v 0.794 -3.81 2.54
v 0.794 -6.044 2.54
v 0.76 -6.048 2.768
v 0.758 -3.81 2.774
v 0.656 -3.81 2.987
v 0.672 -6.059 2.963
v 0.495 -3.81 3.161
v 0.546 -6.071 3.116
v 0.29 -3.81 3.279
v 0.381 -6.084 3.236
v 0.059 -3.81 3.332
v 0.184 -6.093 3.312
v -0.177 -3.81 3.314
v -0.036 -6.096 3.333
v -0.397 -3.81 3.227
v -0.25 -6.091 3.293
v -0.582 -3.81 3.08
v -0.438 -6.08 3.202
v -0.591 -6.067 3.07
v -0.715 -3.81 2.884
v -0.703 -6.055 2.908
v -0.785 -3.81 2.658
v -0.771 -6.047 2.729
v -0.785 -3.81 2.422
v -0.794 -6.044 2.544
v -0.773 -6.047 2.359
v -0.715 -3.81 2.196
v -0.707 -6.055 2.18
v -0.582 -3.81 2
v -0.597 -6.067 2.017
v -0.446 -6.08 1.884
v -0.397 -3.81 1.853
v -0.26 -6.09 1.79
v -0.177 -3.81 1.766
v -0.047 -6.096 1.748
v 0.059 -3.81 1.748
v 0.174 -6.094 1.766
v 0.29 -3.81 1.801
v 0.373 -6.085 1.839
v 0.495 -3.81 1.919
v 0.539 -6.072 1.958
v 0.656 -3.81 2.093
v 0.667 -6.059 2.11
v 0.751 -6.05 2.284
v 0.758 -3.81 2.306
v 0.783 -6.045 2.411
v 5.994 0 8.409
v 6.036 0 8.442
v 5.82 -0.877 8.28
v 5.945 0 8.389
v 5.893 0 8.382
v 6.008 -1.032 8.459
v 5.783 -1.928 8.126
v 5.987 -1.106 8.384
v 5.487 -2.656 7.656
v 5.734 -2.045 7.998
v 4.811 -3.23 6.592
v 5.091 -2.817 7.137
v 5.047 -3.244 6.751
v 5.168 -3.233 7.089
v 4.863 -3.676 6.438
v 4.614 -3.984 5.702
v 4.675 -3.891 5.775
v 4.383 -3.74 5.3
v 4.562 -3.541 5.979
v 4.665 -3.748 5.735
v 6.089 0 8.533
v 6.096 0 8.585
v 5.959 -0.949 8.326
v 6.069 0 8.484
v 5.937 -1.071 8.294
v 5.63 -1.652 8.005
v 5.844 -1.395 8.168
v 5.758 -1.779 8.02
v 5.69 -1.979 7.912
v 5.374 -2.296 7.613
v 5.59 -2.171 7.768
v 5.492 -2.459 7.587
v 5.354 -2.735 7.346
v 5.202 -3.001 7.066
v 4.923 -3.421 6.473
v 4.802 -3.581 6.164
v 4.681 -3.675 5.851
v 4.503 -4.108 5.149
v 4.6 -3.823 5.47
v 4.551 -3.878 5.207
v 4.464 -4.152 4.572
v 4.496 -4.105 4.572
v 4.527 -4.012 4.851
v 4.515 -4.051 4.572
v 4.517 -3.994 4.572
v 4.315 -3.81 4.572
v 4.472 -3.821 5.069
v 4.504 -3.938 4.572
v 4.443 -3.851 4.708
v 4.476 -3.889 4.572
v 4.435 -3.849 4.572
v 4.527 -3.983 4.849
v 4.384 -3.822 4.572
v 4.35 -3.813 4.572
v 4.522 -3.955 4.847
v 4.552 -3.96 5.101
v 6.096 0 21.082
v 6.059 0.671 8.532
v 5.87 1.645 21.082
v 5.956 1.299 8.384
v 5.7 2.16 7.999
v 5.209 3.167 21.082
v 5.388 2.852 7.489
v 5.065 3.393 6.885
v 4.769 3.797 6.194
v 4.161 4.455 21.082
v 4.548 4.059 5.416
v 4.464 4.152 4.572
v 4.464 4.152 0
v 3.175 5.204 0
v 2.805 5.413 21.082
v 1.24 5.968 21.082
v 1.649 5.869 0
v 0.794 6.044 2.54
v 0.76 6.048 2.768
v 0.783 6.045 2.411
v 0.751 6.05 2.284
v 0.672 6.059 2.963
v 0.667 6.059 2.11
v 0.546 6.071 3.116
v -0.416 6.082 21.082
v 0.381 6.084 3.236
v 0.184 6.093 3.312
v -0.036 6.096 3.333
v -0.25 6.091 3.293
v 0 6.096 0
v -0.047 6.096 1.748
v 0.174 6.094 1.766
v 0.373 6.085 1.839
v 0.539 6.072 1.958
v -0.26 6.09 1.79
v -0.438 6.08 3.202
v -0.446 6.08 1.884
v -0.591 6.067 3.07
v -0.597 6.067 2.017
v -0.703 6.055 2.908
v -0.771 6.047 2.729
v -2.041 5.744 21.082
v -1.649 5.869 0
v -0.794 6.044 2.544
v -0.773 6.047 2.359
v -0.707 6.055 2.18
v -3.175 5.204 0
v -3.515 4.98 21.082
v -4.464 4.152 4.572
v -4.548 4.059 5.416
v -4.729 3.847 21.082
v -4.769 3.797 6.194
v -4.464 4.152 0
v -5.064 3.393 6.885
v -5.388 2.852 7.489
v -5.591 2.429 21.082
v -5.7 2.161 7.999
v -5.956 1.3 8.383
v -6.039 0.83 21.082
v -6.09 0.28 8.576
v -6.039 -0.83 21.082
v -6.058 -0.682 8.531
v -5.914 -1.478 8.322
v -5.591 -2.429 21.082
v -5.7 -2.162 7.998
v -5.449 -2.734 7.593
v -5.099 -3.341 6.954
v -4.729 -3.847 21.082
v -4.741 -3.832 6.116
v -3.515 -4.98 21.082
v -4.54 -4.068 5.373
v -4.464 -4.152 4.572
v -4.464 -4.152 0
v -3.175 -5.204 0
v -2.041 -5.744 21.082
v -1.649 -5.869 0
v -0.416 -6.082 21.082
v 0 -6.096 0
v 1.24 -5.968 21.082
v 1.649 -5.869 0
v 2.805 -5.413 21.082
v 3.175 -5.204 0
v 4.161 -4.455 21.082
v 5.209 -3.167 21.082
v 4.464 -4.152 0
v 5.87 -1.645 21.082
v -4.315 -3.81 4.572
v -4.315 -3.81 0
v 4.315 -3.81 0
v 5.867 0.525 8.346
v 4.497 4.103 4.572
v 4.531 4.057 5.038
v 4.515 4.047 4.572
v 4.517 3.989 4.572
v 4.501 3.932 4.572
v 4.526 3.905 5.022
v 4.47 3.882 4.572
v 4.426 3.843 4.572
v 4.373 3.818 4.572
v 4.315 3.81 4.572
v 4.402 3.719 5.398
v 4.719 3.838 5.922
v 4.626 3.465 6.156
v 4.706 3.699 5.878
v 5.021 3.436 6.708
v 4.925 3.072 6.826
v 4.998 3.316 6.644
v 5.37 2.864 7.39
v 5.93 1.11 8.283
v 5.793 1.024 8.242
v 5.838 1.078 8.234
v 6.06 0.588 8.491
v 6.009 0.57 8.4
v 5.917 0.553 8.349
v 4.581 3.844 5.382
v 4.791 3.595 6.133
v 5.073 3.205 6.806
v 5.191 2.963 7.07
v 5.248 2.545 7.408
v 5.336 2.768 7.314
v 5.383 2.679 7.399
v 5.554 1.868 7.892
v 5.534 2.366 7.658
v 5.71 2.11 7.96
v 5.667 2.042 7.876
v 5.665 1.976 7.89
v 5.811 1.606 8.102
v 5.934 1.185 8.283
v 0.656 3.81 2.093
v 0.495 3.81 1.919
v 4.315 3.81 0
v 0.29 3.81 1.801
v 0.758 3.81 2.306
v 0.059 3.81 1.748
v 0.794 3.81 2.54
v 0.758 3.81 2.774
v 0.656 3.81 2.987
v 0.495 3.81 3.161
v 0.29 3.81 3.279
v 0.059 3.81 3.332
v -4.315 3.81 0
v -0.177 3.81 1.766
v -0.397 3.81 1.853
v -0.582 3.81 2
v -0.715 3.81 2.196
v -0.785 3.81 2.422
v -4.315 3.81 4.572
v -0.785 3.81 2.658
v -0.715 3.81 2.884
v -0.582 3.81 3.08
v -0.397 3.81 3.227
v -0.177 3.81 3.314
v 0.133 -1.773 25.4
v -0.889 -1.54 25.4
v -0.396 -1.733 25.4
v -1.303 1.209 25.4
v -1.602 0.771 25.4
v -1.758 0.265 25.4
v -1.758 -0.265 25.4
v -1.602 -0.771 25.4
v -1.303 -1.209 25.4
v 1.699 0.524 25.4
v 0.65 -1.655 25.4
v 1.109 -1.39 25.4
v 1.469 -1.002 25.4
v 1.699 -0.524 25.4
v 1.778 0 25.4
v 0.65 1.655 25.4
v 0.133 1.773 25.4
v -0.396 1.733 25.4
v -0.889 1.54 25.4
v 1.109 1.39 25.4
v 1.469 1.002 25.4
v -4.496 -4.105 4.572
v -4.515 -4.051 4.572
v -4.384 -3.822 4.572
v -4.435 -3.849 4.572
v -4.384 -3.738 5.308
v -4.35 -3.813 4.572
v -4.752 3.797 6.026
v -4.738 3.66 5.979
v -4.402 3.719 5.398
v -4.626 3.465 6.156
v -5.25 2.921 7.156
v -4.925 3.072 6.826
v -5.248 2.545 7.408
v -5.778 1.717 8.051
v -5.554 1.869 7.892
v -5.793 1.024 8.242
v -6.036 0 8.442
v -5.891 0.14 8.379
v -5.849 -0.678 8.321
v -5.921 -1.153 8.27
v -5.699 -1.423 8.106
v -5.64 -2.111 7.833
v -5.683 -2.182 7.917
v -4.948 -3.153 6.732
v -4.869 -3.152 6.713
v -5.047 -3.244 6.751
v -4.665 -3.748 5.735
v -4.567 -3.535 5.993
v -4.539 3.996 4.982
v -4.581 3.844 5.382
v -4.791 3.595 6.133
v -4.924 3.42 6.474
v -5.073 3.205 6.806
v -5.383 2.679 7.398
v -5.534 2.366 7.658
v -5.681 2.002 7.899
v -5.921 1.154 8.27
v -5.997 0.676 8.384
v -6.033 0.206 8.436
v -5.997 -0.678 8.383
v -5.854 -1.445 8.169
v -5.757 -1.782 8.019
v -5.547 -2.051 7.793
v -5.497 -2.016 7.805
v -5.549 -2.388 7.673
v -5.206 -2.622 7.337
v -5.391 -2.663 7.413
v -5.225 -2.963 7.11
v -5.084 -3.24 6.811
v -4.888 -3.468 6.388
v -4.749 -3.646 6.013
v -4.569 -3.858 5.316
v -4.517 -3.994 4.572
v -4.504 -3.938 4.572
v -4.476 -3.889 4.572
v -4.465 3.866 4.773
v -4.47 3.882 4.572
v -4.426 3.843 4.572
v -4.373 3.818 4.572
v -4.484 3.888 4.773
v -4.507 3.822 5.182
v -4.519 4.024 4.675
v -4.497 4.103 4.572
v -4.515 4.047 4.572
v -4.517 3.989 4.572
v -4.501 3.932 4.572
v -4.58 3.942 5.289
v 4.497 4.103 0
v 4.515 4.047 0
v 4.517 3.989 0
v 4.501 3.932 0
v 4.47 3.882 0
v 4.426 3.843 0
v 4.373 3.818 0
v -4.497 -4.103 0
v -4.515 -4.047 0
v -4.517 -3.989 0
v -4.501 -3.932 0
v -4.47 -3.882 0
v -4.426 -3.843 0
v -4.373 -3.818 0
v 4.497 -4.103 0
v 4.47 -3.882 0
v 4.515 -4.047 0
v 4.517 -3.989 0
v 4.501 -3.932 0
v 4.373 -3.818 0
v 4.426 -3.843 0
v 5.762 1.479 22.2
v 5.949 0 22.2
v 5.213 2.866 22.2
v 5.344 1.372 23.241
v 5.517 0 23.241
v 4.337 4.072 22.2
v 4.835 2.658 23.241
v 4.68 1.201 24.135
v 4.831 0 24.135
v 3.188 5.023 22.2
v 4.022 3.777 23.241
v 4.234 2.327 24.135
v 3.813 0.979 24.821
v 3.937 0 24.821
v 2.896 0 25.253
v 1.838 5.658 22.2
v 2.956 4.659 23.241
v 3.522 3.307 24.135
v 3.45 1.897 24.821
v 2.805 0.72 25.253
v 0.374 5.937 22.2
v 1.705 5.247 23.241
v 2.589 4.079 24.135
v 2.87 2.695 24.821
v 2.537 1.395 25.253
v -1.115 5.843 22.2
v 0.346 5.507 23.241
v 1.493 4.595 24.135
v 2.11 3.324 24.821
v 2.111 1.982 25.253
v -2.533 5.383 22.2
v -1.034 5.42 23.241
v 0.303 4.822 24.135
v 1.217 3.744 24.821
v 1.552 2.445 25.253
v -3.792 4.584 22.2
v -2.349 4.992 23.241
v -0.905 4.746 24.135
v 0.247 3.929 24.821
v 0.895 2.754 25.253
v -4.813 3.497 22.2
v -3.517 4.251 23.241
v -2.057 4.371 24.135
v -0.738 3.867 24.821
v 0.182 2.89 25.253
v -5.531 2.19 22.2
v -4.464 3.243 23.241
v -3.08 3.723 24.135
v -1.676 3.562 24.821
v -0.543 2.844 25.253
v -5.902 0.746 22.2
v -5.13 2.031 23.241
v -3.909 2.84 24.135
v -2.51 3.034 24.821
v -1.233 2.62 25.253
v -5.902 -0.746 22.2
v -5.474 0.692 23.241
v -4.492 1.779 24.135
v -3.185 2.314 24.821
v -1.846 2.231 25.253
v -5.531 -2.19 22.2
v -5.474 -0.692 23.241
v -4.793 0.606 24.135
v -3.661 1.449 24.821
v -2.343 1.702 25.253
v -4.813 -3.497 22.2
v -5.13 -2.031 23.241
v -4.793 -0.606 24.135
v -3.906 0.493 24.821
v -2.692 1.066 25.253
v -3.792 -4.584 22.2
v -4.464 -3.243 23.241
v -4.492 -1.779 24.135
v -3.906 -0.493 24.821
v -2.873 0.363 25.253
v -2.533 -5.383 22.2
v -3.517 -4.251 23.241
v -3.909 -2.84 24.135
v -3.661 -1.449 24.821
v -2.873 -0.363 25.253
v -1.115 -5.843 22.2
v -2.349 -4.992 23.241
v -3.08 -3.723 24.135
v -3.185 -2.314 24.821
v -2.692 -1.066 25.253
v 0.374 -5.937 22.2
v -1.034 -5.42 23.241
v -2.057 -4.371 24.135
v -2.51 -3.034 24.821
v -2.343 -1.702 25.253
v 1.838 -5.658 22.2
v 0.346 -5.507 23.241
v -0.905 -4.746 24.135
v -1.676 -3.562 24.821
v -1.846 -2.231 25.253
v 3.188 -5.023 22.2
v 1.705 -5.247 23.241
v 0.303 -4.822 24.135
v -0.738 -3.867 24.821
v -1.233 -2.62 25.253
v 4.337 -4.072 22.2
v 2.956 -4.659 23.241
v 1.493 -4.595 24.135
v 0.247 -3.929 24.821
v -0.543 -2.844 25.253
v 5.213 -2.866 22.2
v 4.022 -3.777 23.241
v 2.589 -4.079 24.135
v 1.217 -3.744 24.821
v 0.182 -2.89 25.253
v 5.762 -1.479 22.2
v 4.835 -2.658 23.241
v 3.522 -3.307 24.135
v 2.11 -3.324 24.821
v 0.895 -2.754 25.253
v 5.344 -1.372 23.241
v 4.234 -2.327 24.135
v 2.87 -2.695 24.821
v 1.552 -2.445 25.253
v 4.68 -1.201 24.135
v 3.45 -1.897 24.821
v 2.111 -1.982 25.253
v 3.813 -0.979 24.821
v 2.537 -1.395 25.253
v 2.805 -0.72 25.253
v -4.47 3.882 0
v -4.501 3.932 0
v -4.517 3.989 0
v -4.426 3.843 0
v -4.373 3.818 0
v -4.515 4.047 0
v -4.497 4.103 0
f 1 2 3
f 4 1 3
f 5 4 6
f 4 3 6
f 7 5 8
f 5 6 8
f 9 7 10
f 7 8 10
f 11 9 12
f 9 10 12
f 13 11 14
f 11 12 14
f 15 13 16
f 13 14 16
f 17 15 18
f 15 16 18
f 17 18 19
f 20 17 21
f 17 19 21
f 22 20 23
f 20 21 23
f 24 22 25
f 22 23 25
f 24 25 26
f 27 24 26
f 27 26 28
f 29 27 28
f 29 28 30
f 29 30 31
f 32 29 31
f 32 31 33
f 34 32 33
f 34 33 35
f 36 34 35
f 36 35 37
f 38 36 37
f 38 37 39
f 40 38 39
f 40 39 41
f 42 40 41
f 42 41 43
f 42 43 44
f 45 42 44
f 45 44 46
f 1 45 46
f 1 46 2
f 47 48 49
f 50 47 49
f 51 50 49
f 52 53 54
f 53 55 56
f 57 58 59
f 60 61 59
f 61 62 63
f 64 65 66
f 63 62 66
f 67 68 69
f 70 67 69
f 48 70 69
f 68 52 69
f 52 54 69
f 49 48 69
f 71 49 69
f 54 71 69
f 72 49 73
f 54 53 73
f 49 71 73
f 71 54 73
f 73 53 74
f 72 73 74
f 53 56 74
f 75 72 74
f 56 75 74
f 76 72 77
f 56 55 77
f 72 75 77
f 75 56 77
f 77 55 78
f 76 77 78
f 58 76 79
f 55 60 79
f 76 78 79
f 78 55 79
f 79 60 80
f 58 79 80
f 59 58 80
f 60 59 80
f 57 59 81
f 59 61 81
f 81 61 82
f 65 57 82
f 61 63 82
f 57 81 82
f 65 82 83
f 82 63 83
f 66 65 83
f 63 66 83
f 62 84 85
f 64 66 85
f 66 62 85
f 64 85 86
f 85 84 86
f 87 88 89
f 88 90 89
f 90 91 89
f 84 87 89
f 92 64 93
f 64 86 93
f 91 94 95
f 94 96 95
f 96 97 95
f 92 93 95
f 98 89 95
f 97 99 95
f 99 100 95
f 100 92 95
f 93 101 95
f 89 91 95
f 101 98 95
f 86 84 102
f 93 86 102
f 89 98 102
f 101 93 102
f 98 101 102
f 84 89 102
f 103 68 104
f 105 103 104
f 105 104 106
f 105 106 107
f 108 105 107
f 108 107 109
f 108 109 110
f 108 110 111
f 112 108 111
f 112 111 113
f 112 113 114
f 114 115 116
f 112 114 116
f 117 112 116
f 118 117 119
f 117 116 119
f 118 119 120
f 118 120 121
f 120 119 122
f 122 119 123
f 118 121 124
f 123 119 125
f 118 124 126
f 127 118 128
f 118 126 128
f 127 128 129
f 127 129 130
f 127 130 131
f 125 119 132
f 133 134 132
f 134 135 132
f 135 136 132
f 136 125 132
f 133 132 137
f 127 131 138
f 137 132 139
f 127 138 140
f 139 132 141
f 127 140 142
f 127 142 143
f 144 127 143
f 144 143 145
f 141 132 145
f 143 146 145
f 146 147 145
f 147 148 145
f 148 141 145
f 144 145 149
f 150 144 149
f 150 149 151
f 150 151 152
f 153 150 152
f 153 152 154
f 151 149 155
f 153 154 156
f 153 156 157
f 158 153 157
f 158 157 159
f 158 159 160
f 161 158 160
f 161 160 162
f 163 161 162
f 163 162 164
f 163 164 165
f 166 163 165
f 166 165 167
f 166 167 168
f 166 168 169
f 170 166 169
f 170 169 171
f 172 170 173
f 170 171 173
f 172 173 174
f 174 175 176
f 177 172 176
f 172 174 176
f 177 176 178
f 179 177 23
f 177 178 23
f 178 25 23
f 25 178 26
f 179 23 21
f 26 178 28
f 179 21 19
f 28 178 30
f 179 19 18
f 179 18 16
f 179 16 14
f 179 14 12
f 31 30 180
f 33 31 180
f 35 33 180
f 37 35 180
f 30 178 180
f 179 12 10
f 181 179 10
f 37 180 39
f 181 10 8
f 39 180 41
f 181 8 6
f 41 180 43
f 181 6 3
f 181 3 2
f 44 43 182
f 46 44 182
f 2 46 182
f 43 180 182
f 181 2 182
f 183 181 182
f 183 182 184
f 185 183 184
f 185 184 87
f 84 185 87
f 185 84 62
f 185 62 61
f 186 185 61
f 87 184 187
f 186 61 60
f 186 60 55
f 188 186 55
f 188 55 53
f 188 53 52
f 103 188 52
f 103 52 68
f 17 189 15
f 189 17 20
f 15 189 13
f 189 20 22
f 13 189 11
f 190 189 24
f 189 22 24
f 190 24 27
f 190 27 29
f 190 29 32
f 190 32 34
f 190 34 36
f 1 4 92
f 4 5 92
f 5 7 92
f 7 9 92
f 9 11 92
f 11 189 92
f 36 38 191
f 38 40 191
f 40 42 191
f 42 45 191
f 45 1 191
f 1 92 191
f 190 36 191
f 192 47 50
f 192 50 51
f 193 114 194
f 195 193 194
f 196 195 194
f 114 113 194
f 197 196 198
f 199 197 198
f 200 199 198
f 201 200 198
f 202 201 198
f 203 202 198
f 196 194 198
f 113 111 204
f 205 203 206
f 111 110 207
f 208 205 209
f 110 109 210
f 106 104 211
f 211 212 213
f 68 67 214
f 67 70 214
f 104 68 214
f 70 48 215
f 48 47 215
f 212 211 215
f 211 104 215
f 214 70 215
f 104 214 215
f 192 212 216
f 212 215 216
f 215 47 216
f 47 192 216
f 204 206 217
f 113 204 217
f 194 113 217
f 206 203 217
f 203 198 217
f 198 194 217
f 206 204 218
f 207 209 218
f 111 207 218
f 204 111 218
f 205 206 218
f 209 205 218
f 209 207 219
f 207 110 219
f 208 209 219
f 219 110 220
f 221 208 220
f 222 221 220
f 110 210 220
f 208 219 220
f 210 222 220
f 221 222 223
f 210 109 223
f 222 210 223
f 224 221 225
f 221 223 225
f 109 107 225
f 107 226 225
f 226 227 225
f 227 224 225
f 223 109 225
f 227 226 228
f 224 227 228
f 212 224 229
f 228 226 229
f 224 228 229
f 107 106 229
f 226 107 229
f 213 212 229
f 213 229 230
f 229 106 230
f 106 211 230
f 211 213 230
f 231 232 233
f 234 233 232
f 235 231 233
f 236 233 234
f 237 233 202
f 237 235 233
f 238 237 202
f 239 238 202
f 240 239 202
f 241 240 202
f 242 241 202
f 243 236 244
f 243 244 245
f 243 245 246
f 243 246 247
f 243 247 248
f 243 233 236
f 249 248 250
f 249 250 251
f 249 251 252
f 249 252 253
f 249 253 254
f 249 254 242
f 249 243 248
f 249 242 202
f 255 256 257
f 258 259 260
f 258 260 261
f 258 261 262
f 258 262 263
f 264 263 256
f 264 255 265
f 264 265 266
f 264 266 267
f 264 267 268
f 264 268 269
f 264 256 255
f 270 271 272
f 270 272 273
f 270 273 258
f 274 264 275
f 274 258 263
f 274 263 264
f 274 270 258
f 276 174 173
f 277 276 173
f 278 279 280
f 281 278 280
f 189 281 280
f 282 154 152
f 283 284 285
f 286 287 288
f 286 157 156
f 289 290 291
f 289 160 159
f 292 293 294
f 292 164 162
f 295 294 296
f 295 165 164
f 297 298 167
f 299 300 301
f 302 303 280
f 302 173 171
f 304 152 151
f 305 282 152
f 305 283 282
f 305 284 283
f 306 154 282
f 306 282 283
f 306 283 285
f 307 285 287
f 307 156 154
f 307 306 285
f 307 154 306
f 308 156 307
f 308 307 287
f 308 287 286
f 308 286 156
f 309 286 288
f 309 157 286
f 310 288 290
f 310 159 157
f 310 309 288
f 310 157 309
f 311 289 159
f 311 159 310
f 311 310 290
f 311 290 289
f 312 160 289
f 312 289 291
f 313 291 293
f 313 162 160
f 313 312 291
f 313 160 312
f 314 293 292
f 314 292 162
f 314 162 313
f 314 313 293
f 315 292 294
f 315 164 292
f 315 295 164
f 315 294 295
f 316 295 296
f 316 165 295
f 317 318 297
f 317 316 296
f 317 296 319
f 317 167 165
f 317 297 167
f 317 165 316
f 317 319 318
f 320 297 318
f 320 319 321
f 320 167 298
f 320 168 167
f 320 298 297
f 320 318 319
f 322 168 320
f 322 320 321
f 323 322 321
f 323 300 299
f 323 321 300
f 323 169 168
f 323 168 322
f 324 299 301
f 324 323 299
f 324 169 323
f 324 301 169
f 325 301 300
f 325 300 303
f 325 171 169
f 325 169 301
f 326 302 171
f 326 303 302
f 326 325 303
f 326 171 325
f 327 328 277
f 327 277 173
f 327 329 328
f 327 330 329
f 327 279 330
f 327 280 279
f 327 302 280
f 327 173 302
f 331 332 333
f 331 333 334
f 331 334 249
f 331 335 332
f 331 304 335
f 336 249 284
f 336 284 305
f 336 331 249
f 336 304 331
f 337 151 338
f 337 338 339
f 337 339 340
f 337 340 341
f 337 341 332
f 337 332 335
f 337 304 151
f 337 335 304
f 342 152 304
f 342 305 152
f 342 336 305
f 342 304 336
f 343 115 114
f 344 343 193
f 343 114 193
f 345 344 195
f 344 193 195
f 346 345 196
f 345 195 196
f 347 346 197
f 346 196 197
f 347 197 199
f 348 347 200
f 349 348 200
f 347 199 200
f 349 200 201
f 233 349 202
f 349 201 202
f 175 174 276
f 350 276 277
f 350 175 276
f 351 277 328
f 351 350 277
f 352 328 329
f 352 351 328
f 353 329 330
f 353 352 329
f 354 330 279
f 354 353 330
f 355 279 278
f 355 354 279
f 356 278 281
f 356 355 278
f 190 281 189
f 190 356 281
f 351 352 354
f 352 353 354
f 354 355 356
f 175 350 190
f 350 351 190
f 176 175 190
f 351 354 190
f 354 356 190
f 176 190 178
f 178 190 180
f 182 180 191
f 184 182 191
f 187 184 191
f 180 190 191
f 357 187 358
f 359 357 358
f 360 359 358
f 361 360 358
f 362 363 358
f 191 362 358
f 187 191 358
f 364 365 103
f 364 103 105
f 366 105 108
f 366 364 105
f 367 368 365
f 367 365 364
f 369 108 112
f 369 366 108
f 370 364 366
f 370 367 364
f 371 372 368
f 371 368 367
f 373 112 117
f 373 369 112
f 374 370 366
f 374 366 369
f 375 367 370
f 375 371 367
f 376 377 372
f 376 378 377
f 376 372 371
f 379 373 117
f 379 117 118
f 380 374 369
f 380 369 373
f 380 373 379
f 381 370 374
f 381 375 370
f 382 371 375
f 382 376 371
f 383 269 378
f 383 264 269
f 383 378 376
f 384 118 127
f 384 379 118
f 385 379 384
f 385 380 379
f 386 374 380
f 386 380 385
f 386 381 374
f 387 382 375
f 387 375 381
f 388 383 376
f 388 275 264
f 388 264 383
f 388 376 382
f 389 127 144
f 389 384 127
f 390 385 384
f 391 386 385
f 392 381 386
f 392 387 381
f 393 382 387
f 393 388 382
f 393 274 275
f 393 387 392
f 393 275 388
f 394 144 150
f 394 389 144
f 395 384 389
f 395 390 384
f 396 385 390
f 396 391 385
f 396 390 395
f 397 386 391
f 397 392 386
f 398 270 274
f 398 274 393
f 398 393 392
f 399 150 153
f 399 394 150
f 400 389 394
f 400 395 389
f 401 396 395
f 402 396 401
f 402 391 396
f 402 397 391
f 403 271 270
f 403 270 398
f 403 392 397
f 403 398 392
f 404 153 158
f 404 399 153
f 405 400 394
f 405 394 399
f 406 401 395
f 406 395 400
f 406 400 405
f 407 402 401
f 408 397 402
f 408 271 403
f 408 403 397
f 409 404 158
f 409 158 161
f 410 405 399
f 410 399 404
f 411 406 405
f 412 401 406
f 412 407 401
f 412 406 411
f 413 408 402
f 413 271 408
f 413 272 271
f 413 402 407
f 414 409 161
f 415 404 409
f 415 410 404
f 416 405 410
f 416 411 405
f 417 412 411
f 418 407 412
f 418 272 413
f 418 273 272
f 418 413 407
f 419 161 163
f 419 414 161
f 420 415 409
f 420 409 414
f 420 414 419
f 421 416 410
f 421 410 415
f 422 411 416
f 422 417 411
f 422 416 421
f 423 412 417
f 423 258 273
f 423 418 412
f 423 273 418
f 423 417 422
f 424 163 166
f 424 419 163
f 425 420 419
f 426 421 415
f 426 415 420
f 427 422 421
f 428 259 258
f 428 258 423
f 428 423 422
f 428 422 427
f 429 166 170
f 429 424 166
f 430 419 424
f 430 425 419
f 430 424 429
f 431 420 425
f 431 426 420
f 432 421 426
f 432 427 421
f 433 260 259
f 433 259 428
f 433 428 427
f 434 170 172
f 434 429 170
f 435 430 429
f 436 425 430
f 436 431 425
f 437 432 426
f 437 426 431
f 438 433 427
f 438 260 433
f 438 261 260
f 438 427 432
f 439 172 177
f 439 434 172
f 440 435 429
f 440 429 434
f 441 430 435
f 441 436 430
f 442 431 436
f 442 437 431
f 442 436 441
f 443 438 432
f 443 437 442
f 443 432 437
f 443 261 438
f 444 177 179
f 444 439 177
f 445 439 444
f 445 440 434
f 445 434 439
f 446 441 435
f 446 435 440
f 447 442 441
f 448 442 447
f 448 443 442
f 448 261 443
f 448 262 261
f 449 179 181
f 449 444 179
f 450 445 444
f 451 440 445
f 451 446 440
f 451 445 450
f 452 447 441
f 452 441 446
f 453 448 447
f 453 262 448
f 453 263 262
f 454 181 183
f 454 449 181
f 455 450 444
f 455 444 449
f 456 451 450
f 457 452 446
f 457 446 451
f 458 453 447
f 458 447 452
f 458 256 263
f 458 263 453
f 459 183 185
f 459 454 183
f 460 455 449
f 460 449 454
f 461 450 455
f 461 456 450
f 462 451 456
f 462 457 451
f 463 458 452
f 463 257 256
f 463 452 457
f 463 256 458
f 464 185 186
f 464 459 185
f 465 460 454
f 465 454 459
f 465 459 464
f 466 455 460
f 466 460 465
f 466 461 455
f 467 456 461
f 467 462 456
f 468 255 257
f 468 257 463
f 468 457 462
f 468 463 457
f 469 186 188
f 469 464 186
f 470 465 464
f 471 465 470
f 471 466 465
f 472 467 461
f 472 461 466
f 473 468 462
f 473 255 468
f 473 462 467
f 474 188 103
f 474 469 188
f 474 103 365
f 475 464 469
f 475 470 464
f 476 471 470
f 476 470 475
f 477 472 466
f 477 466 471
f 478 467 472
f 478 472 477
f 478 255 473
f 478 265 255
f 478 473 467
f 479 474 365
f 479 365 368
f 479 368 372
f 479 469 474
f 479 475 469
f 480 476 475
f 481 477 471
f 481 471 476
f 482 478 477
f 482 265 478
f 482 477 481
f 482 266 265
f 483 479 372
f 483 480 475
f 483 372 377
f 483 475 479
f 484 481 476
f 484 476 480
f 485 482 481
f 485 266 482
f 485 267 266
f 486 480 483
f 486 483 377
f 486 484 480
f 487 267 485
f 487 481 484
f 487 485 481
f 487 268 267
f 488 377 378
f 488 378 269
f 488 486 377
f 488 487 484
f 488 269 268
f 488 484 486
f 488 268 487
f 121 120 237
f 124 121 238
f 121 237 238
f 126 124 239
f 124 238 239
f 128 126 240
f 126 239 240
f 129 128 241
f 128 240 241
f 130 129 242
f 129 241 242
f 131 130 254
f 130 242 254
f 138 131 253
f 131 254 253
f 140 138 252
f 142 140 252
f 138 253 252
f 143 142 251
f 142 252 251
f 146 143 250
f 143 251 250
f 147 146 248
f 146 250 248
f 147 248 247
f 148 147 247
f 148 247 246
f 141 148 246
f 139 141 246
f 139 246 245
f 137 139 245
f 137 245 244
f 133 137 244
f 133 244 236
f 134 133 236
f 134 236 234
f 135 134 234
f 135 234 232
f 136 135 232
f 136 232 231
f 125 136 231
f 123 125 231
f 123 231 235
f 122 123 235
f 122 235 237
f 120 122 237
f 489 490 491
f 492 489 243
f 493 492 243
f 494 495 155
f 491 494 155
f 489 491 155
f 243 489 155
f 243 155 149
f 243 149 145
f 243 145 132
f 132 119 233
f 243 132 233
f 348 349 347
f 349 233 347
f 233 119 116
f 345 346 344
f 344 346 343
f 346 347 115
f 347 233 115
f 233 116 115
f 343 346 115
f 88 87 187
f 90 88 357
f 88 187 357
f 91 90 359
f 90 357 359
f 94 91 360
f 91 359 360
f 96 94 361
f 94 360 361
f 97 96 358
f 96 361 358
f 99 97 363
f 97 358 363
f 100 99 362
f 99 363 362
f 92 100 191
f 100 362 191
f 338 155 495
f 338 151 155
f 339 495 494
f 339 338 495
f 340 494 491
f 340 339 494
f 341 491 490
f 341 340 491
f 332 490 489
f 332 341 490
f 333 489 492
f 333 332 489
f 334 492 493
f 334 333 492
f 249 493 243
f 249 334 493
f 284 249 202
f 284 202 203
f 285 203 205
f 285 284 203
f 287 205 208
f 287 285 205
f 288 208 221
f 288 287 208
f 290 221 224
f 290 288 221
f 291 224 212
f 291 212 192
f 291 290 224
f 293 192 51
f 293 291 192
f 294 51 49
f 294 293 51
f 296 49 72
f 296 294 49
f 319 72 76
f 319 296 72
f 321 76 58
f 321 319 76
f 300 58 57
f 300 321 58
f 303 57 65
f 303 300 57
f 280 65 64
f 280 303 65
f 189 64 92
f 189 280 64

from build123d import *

# Parameters (mm, degrees)
F0_R          = 6.096
F1_DEPTH      = 25.4
F2_R          = 4.318
F3_R          = 0.79375
F4_DEPTH      = 6.097
F4_DEPTH_BACK = 6.097
F6_DEPTH      = 6.0970001
F6_DEPTH_BACK = 6.0970001
F7_R          = 0.2032


with BuildPart() as f1:
    # F0 (on Top) → F1 (new body)
    with BuildSketch(Plane.XY):
        Circle(F0_R)
    extrude(amount=F1_DEPTH)

    # F2
    f2_edges = [f1.edges().sort_by_distance(p)[0] for p in [
        (-6.096, 0, 25.4),
    ]]
    fillet(f2_edges, radius=F2_R)

    # F3 (on Front) → F4 (cut, two sides)
    with BuildSketch(Plane.XZ) as f4_sk:
        with Locations((0, 2.54)):
            Circle(F3_R)
    extrude(amount=-F4_DEPTH, mode=Mode.SUBTRACT)
    extrude(f4_sk.sketch, amount=F4_DEPTH_BACK, mode=Mode.SUBTRACT)

    # F5 (on Right) → F6 (cut, two sides)
    with BuildSketch(Plane.YZ) as f6_sk:
        with BuildLine():
            Line((-3.81, 0), (0, 0))
            Line((0, 0), (3.81, 0))
            Line((3.81, 0), (3.81, 4.572))
            ThreePointArc((3.81, 4.572), (0, 8.382), (-3.81, 4.572))
            Line((-3.81, 4.572), (-3.81, 0))
        make_face()
    extrude(amount=-F6_DEPTH, mode=Mode.SUBTRACT)
    extrude(f6_sk.sketch, amount=F6_DEPTH_BACK, mode=Mode.SUBTRACT)

    # F7
    f7_edges = [f1.edges().sort_by_distance(p)[0] for p in [
        (-4.758688, -3.81, 2.286),
        (4.758688, -3.81, 2.286),
        (5.465335, 2.700246, 7.259894),
        (-6.096, 0, 8.382),
        (5.465335, -2.700246, 7.259894),
        (4.758688, 3.81, 2.286),
        (-4.758688, 3.81, 2.286),
    ]]
    fillet(f7_edges, radius=F7_R)


solid = f1.part
